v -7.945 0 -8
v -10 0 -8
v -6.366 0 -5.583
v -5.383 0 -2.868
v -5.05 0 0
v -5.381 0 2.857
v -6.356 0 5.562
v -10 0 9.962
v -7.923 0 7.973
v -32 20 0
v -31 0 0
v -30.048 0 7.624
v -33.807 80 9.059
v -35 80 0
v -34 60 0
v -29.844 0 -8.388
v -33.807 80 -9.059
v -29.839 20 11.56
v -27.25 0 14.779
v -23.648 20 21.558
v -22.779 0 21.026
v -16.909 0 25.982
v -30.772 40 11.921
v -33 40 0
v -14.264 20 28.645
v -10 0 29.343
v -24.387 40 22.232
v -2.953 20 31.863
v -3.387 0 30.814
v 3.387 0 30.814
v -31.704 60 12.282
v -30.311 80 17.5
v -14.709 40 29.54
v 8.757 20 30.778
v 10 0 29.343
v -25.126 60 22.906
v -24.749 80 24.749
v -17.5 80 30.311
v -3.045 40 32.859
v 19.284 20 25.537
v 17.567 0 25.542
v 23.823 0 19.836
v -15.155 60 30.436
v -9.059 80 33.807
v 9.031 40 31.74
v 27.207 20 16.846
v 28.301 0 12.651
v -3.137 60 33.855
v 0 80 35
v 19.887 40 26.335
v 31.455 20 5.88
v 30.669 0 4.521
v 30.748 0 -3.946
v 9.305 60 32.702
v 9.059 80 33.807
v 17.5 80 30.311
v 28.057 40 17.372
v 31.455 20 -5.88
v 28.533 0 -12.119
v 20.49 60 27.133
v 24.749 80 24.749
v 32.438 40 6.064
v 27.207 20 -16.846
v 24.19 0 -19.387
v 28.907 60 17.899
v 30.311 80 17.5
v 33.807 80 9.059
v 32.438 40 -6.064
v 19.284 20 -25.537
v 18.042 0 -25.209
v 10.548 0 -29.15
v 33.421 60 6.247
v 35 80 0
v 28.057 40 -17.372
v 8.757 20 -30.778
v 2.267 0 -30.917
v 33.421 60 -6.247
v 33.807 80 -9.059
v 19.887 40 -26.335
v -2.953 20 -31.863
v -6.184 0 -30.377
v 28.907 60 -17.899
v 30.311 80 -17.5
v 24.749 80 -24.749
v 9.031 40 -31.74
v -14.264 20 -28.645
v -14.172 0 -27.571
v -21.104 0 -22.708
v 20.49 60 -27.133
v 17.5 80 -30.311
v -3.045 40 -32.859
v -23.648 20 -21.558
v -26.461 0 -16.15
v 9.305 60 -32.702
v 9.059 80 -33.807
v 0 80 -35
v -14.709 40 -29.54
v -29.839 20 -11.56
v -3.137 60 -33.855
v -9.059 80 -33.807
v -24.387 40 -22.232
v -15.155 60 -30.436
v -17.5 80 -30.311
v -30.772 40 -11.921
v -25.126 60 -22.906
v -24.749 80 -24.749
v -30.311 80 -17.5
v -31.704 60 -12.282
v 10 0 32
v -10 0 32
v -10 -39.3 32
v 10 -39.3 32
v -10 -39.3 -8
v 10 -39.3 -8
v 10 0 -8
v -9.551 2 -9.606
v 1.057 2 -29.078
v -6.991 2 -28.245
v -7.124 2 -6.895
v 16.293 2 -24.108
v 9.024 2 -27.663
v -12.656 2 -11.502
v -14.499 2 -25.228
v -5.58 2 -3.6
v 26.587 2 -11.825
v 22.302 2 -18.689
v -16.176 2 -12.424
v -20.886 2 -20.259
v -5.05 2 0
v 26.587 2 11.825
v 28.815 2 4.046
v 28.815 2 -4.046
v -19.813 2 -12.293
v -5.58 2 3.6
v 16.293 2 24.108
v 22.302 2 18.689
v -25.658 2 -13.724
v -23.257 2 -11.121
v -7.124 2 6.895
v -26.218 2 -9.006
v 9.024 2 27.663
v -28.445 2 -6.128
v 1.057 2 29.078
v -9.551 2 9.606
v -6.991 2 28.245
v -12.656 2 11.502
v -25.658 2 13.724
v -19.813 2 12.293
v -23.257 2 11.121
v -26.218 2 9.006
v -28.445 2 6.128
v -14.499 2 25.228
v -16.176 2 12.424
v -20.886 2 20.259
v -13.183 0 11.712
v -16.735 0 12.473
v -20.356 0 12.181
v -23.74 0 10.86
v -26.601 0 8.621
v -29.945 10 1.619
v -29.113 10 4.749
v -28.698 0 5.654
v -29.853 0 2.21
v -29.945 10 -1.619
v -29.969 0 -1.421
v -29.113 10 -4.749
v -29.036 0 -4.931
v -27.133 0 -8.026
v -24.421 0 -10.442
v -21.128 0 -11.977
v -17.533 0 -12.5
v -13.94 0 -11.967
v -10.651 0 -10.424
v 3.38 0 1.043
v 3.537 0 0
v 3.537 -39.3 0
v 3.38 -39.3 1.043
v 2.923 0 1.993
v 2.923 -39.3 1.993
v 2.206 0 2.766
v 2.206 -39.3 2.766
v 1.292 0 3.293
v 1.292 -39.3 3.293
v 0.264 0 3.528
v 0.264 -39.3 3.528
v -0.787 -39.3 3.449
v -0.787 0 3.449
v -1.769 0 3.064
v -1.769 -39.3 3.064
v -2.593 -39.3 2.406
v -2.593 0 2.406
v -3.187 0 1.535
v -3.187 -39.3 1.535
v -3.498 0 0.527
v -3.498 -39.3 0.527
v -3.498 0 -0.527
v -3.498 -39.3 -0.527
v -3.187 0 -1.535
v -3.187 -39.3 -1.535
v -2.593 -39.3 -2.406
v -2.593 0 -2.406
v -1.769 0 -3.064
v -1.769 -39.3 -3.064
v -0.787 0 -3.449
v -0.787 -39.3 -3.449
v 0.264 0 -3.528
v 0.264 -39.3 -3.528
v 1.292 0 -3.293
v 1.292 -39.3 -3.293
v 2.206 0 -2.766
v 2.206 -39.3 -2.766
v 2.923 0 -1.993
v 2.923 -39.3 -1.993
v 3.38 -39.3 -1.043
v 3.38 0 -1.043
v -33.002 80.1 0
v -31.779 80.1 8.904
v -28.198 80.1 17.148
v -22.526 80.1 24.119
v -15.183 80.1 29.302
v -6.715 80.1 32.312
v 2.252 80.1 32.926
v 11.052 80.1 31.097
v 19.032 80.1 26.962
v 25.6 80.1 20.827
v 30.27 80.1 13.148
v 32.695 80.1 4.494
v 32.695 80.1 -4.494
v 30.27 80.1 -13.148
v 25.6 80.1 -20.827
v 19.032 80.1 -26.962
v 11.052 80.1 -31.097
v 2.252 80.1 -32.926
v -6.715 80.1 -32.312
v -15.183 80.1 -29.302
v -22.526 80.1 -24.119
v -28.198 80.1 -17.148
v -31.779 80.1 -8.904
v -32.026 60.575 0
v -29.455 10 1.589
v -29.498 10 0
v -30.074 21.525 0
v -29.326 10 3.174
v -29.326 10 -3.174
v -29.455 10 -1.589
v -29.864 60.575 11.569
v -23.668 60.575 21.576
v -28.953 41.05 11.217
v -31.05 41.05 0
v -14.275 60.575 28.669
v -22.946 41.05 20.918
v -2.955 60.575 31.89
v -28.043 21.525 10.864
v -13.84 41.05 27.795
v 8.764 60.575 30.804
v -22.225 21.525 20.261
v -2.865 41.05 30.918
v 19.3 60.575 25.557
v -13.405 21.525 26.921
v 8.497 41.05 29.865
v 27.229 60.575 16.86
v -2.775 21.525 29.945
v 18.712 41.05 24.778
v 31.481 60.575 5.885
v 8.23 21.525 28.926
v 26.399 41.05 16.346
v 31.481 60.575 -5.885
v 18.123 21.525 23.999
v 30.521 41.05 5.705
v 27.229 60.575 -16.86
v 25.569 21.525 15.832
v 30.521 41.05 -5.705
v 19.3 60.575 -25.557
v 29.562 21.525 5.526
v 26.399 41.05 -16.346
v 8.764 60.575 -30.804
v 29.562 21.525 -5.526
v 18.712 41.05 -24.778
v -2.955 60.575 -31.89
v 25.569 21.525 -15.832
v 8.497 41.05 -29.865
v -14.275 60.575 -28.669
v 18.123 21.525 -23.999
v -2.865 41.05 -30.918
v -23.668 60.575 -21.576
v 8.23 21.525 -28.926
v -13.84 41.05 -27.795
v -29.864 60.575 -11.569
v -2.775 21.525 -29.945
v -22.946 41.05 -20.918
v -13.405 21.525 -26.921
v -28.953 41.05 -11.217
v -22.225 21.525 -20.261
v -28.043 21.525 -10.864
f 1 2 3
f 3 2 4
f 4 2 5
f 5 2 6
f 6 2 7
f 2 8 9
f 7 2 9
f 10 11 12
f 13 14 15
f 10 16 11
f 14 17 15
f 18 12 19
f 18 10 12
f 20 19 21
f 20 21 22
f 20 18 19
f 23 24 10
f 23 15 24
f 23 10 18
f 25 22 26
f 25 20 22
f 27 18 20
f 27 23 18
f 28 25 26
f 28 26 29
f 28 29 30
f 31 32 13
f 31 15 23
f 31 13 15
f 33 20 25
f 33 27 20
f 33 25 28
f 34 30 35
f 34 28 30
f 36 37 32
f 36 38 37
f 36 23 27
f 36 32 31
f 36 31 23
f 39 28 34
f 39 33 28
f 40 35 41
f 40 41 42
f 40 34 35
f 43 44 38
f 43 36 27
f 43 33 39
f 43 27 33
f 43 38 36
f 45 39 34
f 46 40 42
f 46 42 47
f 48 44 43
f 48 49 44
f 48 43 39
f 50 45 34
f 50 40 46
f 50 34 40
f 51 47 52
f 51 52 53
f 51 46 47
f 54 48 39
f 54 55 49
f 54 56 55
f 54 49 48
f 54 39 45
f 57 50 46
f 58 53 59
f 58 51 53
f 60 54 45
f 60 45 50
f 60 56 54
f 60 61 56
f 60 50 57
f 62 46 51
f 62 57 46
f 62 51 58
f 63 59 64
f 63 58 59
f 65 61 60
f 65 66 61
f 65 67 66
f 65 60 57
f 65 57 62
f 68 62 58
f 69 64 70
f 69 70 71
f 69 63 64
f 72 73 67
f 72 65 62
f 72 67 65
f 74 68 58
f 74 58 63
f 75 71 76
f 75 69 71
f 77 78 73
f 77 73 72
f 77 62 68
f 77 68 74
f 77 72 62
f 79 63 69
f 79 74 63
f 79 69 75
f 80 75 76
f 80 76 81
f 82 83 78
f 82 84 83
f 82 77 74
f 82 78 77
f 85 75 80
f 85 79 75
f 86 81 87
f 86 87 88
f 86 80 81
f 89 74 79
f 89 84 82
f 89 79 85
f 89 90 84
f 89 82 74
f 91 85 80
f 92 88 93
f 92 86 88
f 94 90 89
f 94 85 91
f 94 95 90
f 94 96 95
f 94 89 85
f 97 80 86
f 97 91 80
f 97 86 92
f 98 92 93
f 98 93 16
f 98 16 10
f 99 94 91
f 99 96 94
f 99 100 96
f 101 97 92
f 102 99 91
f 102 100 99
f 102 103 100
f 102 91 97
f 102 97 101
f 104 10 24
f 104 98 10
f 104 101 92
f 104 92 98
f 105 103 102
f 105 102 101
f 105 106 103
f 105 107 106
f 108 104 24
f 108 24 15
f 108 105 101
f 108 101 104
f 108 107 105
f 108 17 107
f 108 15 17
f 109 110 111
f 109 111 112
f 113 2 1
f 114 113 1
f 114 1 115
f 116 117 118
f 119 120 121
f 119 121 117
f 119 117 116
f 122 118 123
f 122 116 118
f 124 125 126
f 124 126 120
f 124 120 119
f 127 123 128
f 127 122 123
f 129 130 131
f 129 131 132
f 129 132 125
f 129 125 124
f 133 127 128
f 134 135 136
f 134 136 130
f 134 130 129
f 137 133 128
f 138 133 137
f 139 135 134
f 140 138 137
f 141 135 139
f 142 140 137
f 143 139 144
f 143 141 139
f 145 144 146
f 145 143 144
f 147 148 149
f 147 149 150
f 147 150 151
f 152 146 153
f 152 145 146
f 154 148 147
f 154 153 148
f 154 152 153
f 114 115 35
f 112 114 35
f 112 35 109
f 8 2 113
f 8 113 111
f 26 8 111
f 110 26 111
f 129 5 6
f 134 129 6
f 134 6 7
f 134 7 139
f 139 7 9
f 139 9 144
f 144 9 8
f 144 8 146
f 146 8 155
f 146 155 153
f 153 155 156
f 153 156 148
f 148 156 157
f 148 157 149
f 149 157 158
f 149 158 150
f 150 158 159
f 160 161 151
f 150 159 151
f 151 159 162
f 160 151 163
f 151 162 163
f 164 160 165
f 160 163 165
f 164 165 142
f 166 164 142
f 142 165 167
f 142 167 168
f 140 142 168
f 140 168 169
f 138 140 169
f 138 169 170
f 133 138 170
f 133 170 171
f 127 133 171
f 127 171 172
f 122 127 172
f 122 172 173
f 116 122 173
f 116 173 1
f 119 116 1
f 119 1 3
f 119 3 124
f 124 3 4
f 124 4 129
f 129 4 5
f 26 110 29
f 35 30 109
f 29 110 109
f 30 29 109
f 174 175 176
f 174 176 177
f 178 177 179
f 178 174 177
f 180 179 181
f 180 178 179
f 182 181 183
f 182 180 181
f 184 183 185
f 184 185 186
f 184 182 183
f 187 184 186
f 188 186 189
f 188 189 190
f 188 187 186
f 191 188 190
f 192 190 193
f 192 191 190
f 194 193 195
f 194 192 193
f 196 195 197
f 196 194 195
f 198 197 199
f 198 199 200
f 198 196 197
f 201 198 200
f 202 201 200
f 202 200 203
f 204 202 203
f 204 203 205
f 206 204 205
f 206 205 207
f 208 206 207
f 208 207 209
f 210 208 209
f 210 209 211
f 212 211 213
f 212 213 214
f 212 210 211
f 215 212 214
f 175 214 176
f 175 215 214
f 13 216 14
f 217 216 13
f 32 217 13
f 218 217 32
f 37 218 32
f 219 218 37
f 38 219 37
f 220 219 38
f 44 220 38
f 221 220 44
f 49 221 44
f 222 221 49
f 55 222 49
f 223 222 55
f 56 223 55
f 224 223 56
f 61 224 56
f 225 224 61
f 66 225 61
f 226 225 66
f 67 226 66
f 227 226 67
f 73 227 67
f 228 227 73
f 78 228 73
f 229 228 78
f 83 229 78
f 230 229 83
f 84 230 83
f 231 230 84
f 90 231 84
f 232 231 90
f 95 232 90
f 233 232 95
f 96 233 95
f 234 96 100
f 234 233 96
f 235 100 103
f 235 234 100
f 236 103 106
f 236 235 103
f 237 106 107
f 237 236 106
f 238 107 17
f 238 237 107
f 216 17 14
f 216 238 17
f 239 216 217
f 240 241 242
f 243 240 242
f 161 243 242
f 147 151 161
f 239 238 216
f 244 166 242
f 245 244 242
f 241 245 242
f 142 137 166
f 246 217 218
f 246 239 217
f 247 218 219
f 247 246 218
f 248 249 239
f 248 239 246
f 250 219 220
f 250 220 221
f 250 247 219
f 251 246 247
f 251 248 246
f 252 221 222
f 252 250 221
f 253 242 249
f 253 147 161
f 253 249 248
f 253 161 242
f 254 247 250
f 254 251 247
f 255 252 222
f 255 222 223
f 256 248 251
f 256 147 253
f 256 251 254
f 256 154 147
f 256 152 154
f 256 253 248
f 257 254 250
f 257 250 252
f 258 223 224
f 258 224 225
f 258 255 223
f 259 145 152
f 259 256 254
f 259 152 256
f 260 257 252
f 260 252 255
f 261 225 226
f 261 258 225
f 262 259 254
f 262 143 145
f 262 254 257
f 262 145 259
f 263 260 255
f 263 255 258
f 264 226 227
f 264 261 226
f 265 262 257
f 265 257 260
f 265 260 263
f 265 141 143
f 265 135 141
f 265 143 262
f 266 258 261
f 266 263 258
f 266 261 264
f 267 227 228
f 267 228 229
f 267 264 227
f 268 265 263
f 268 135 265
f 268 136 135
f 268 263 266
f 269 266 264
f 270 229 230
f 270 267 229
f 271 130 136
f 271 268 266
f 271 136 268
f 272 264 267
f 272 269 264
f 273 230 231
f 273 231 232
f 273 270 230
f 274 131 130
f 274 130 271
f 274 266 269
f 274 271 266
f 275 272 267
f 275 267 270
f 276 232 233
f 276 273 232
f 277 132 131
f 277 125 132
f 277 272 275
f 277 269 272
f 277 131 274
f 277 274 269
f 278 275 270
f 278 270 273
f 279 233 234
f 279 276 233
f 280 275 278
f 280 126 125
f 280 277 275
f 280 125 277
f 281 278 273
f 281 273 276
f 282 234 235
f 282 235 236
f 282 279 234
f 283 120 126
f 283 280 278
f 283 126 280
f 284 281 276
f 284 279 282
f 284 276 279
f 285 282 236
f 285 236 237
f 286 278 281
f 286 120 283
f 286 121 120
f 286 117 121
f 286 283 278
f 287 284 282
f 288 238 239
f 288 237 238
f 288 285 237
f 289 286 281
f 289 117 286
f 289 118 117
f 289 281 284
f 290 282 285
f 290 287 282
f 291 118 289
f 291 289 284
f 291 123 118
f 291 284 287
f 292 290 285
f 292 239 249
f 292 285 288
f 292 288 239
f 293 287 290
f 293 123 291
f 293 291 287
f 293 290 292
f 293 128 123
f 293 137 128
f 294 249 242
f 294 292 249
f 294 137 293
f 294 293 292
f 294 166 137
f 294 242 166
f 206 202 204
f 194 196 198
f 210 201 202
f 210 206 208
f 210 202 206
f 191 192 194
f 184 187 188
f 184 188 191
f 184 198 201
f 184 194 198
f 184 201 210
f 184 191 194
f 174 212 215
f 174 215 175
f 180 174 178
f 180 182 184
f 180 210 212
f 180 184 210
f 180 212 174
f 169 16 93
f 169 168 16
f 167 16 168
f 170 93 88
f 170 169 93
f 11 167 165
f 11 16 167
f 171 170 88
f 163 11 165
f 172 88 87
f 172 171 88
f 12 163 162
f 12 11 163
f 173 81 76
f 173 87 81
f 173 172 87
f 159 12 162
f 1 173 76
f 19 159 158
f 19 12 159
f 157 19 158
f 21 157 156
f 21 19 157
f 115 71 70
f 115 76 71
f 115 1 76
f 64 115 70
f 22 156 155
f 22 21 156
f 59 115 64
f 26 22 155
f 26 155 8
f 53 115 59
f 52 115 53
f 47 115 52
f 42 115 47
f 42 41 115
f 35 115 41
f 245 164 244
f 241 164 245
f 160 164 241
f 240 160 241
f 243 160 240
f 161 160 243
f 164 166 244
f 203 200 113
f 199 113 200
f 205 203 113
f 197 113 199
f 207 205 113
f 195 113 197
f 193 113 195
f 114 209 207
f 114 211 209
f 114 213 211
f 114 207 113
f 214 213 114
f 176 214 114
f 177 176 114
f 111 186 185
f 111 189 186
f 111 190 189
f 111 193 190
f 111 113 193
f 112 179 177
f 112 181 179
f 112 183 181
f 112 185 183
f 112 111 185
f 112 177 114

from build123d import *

# Parameters (mm, degrees)
SKETCH2_R           = 12.5
CUT_EXTRUDE1_DEPTH  = 10
SKETCH3_W           = 20
SKETCH3_H           = 40
SKETCH3_R           = 3.537482137
BOSS_EXTRUDE1_DEPTH = 39.3


with BuildPart() as part:
    # Sketch1 → Revolve1 (revolve)
    with BuildSketch(Plane.XY):
        Polygon((0, 0), (-31, 0), (-35, 80), (-33.002495322, 80.099875234), (-29.097501561, 2), (0, 2), align=None)
    revolve(axis=Axis((0, 0, 0), (0, 1, 0)))

    # Sketch2 → Cut-Extrude1 (cut)
    with BuildSketch(Plane.XZ):
        with Locations((-17.550020437, 0)):
            Circle(SKETCH2_R)
    extrude(amount=-CUT_EXTRUDE1_DEPTH, mode=Mode.SUBTRACT)

    # Sketch3 → Boss-Extrude1 (add)
    with BuildSketch(Plane.XZ):
        with Locations((0, 12)):
            Rectangle(SKETCH3_W, SKETCH3_H)
        Circle(SKETCH3_R, mode=Mode.SUBTRACT)
    extrude(amount=BOSS_EXTRUDE1_DEPTH)


solid = part.part
